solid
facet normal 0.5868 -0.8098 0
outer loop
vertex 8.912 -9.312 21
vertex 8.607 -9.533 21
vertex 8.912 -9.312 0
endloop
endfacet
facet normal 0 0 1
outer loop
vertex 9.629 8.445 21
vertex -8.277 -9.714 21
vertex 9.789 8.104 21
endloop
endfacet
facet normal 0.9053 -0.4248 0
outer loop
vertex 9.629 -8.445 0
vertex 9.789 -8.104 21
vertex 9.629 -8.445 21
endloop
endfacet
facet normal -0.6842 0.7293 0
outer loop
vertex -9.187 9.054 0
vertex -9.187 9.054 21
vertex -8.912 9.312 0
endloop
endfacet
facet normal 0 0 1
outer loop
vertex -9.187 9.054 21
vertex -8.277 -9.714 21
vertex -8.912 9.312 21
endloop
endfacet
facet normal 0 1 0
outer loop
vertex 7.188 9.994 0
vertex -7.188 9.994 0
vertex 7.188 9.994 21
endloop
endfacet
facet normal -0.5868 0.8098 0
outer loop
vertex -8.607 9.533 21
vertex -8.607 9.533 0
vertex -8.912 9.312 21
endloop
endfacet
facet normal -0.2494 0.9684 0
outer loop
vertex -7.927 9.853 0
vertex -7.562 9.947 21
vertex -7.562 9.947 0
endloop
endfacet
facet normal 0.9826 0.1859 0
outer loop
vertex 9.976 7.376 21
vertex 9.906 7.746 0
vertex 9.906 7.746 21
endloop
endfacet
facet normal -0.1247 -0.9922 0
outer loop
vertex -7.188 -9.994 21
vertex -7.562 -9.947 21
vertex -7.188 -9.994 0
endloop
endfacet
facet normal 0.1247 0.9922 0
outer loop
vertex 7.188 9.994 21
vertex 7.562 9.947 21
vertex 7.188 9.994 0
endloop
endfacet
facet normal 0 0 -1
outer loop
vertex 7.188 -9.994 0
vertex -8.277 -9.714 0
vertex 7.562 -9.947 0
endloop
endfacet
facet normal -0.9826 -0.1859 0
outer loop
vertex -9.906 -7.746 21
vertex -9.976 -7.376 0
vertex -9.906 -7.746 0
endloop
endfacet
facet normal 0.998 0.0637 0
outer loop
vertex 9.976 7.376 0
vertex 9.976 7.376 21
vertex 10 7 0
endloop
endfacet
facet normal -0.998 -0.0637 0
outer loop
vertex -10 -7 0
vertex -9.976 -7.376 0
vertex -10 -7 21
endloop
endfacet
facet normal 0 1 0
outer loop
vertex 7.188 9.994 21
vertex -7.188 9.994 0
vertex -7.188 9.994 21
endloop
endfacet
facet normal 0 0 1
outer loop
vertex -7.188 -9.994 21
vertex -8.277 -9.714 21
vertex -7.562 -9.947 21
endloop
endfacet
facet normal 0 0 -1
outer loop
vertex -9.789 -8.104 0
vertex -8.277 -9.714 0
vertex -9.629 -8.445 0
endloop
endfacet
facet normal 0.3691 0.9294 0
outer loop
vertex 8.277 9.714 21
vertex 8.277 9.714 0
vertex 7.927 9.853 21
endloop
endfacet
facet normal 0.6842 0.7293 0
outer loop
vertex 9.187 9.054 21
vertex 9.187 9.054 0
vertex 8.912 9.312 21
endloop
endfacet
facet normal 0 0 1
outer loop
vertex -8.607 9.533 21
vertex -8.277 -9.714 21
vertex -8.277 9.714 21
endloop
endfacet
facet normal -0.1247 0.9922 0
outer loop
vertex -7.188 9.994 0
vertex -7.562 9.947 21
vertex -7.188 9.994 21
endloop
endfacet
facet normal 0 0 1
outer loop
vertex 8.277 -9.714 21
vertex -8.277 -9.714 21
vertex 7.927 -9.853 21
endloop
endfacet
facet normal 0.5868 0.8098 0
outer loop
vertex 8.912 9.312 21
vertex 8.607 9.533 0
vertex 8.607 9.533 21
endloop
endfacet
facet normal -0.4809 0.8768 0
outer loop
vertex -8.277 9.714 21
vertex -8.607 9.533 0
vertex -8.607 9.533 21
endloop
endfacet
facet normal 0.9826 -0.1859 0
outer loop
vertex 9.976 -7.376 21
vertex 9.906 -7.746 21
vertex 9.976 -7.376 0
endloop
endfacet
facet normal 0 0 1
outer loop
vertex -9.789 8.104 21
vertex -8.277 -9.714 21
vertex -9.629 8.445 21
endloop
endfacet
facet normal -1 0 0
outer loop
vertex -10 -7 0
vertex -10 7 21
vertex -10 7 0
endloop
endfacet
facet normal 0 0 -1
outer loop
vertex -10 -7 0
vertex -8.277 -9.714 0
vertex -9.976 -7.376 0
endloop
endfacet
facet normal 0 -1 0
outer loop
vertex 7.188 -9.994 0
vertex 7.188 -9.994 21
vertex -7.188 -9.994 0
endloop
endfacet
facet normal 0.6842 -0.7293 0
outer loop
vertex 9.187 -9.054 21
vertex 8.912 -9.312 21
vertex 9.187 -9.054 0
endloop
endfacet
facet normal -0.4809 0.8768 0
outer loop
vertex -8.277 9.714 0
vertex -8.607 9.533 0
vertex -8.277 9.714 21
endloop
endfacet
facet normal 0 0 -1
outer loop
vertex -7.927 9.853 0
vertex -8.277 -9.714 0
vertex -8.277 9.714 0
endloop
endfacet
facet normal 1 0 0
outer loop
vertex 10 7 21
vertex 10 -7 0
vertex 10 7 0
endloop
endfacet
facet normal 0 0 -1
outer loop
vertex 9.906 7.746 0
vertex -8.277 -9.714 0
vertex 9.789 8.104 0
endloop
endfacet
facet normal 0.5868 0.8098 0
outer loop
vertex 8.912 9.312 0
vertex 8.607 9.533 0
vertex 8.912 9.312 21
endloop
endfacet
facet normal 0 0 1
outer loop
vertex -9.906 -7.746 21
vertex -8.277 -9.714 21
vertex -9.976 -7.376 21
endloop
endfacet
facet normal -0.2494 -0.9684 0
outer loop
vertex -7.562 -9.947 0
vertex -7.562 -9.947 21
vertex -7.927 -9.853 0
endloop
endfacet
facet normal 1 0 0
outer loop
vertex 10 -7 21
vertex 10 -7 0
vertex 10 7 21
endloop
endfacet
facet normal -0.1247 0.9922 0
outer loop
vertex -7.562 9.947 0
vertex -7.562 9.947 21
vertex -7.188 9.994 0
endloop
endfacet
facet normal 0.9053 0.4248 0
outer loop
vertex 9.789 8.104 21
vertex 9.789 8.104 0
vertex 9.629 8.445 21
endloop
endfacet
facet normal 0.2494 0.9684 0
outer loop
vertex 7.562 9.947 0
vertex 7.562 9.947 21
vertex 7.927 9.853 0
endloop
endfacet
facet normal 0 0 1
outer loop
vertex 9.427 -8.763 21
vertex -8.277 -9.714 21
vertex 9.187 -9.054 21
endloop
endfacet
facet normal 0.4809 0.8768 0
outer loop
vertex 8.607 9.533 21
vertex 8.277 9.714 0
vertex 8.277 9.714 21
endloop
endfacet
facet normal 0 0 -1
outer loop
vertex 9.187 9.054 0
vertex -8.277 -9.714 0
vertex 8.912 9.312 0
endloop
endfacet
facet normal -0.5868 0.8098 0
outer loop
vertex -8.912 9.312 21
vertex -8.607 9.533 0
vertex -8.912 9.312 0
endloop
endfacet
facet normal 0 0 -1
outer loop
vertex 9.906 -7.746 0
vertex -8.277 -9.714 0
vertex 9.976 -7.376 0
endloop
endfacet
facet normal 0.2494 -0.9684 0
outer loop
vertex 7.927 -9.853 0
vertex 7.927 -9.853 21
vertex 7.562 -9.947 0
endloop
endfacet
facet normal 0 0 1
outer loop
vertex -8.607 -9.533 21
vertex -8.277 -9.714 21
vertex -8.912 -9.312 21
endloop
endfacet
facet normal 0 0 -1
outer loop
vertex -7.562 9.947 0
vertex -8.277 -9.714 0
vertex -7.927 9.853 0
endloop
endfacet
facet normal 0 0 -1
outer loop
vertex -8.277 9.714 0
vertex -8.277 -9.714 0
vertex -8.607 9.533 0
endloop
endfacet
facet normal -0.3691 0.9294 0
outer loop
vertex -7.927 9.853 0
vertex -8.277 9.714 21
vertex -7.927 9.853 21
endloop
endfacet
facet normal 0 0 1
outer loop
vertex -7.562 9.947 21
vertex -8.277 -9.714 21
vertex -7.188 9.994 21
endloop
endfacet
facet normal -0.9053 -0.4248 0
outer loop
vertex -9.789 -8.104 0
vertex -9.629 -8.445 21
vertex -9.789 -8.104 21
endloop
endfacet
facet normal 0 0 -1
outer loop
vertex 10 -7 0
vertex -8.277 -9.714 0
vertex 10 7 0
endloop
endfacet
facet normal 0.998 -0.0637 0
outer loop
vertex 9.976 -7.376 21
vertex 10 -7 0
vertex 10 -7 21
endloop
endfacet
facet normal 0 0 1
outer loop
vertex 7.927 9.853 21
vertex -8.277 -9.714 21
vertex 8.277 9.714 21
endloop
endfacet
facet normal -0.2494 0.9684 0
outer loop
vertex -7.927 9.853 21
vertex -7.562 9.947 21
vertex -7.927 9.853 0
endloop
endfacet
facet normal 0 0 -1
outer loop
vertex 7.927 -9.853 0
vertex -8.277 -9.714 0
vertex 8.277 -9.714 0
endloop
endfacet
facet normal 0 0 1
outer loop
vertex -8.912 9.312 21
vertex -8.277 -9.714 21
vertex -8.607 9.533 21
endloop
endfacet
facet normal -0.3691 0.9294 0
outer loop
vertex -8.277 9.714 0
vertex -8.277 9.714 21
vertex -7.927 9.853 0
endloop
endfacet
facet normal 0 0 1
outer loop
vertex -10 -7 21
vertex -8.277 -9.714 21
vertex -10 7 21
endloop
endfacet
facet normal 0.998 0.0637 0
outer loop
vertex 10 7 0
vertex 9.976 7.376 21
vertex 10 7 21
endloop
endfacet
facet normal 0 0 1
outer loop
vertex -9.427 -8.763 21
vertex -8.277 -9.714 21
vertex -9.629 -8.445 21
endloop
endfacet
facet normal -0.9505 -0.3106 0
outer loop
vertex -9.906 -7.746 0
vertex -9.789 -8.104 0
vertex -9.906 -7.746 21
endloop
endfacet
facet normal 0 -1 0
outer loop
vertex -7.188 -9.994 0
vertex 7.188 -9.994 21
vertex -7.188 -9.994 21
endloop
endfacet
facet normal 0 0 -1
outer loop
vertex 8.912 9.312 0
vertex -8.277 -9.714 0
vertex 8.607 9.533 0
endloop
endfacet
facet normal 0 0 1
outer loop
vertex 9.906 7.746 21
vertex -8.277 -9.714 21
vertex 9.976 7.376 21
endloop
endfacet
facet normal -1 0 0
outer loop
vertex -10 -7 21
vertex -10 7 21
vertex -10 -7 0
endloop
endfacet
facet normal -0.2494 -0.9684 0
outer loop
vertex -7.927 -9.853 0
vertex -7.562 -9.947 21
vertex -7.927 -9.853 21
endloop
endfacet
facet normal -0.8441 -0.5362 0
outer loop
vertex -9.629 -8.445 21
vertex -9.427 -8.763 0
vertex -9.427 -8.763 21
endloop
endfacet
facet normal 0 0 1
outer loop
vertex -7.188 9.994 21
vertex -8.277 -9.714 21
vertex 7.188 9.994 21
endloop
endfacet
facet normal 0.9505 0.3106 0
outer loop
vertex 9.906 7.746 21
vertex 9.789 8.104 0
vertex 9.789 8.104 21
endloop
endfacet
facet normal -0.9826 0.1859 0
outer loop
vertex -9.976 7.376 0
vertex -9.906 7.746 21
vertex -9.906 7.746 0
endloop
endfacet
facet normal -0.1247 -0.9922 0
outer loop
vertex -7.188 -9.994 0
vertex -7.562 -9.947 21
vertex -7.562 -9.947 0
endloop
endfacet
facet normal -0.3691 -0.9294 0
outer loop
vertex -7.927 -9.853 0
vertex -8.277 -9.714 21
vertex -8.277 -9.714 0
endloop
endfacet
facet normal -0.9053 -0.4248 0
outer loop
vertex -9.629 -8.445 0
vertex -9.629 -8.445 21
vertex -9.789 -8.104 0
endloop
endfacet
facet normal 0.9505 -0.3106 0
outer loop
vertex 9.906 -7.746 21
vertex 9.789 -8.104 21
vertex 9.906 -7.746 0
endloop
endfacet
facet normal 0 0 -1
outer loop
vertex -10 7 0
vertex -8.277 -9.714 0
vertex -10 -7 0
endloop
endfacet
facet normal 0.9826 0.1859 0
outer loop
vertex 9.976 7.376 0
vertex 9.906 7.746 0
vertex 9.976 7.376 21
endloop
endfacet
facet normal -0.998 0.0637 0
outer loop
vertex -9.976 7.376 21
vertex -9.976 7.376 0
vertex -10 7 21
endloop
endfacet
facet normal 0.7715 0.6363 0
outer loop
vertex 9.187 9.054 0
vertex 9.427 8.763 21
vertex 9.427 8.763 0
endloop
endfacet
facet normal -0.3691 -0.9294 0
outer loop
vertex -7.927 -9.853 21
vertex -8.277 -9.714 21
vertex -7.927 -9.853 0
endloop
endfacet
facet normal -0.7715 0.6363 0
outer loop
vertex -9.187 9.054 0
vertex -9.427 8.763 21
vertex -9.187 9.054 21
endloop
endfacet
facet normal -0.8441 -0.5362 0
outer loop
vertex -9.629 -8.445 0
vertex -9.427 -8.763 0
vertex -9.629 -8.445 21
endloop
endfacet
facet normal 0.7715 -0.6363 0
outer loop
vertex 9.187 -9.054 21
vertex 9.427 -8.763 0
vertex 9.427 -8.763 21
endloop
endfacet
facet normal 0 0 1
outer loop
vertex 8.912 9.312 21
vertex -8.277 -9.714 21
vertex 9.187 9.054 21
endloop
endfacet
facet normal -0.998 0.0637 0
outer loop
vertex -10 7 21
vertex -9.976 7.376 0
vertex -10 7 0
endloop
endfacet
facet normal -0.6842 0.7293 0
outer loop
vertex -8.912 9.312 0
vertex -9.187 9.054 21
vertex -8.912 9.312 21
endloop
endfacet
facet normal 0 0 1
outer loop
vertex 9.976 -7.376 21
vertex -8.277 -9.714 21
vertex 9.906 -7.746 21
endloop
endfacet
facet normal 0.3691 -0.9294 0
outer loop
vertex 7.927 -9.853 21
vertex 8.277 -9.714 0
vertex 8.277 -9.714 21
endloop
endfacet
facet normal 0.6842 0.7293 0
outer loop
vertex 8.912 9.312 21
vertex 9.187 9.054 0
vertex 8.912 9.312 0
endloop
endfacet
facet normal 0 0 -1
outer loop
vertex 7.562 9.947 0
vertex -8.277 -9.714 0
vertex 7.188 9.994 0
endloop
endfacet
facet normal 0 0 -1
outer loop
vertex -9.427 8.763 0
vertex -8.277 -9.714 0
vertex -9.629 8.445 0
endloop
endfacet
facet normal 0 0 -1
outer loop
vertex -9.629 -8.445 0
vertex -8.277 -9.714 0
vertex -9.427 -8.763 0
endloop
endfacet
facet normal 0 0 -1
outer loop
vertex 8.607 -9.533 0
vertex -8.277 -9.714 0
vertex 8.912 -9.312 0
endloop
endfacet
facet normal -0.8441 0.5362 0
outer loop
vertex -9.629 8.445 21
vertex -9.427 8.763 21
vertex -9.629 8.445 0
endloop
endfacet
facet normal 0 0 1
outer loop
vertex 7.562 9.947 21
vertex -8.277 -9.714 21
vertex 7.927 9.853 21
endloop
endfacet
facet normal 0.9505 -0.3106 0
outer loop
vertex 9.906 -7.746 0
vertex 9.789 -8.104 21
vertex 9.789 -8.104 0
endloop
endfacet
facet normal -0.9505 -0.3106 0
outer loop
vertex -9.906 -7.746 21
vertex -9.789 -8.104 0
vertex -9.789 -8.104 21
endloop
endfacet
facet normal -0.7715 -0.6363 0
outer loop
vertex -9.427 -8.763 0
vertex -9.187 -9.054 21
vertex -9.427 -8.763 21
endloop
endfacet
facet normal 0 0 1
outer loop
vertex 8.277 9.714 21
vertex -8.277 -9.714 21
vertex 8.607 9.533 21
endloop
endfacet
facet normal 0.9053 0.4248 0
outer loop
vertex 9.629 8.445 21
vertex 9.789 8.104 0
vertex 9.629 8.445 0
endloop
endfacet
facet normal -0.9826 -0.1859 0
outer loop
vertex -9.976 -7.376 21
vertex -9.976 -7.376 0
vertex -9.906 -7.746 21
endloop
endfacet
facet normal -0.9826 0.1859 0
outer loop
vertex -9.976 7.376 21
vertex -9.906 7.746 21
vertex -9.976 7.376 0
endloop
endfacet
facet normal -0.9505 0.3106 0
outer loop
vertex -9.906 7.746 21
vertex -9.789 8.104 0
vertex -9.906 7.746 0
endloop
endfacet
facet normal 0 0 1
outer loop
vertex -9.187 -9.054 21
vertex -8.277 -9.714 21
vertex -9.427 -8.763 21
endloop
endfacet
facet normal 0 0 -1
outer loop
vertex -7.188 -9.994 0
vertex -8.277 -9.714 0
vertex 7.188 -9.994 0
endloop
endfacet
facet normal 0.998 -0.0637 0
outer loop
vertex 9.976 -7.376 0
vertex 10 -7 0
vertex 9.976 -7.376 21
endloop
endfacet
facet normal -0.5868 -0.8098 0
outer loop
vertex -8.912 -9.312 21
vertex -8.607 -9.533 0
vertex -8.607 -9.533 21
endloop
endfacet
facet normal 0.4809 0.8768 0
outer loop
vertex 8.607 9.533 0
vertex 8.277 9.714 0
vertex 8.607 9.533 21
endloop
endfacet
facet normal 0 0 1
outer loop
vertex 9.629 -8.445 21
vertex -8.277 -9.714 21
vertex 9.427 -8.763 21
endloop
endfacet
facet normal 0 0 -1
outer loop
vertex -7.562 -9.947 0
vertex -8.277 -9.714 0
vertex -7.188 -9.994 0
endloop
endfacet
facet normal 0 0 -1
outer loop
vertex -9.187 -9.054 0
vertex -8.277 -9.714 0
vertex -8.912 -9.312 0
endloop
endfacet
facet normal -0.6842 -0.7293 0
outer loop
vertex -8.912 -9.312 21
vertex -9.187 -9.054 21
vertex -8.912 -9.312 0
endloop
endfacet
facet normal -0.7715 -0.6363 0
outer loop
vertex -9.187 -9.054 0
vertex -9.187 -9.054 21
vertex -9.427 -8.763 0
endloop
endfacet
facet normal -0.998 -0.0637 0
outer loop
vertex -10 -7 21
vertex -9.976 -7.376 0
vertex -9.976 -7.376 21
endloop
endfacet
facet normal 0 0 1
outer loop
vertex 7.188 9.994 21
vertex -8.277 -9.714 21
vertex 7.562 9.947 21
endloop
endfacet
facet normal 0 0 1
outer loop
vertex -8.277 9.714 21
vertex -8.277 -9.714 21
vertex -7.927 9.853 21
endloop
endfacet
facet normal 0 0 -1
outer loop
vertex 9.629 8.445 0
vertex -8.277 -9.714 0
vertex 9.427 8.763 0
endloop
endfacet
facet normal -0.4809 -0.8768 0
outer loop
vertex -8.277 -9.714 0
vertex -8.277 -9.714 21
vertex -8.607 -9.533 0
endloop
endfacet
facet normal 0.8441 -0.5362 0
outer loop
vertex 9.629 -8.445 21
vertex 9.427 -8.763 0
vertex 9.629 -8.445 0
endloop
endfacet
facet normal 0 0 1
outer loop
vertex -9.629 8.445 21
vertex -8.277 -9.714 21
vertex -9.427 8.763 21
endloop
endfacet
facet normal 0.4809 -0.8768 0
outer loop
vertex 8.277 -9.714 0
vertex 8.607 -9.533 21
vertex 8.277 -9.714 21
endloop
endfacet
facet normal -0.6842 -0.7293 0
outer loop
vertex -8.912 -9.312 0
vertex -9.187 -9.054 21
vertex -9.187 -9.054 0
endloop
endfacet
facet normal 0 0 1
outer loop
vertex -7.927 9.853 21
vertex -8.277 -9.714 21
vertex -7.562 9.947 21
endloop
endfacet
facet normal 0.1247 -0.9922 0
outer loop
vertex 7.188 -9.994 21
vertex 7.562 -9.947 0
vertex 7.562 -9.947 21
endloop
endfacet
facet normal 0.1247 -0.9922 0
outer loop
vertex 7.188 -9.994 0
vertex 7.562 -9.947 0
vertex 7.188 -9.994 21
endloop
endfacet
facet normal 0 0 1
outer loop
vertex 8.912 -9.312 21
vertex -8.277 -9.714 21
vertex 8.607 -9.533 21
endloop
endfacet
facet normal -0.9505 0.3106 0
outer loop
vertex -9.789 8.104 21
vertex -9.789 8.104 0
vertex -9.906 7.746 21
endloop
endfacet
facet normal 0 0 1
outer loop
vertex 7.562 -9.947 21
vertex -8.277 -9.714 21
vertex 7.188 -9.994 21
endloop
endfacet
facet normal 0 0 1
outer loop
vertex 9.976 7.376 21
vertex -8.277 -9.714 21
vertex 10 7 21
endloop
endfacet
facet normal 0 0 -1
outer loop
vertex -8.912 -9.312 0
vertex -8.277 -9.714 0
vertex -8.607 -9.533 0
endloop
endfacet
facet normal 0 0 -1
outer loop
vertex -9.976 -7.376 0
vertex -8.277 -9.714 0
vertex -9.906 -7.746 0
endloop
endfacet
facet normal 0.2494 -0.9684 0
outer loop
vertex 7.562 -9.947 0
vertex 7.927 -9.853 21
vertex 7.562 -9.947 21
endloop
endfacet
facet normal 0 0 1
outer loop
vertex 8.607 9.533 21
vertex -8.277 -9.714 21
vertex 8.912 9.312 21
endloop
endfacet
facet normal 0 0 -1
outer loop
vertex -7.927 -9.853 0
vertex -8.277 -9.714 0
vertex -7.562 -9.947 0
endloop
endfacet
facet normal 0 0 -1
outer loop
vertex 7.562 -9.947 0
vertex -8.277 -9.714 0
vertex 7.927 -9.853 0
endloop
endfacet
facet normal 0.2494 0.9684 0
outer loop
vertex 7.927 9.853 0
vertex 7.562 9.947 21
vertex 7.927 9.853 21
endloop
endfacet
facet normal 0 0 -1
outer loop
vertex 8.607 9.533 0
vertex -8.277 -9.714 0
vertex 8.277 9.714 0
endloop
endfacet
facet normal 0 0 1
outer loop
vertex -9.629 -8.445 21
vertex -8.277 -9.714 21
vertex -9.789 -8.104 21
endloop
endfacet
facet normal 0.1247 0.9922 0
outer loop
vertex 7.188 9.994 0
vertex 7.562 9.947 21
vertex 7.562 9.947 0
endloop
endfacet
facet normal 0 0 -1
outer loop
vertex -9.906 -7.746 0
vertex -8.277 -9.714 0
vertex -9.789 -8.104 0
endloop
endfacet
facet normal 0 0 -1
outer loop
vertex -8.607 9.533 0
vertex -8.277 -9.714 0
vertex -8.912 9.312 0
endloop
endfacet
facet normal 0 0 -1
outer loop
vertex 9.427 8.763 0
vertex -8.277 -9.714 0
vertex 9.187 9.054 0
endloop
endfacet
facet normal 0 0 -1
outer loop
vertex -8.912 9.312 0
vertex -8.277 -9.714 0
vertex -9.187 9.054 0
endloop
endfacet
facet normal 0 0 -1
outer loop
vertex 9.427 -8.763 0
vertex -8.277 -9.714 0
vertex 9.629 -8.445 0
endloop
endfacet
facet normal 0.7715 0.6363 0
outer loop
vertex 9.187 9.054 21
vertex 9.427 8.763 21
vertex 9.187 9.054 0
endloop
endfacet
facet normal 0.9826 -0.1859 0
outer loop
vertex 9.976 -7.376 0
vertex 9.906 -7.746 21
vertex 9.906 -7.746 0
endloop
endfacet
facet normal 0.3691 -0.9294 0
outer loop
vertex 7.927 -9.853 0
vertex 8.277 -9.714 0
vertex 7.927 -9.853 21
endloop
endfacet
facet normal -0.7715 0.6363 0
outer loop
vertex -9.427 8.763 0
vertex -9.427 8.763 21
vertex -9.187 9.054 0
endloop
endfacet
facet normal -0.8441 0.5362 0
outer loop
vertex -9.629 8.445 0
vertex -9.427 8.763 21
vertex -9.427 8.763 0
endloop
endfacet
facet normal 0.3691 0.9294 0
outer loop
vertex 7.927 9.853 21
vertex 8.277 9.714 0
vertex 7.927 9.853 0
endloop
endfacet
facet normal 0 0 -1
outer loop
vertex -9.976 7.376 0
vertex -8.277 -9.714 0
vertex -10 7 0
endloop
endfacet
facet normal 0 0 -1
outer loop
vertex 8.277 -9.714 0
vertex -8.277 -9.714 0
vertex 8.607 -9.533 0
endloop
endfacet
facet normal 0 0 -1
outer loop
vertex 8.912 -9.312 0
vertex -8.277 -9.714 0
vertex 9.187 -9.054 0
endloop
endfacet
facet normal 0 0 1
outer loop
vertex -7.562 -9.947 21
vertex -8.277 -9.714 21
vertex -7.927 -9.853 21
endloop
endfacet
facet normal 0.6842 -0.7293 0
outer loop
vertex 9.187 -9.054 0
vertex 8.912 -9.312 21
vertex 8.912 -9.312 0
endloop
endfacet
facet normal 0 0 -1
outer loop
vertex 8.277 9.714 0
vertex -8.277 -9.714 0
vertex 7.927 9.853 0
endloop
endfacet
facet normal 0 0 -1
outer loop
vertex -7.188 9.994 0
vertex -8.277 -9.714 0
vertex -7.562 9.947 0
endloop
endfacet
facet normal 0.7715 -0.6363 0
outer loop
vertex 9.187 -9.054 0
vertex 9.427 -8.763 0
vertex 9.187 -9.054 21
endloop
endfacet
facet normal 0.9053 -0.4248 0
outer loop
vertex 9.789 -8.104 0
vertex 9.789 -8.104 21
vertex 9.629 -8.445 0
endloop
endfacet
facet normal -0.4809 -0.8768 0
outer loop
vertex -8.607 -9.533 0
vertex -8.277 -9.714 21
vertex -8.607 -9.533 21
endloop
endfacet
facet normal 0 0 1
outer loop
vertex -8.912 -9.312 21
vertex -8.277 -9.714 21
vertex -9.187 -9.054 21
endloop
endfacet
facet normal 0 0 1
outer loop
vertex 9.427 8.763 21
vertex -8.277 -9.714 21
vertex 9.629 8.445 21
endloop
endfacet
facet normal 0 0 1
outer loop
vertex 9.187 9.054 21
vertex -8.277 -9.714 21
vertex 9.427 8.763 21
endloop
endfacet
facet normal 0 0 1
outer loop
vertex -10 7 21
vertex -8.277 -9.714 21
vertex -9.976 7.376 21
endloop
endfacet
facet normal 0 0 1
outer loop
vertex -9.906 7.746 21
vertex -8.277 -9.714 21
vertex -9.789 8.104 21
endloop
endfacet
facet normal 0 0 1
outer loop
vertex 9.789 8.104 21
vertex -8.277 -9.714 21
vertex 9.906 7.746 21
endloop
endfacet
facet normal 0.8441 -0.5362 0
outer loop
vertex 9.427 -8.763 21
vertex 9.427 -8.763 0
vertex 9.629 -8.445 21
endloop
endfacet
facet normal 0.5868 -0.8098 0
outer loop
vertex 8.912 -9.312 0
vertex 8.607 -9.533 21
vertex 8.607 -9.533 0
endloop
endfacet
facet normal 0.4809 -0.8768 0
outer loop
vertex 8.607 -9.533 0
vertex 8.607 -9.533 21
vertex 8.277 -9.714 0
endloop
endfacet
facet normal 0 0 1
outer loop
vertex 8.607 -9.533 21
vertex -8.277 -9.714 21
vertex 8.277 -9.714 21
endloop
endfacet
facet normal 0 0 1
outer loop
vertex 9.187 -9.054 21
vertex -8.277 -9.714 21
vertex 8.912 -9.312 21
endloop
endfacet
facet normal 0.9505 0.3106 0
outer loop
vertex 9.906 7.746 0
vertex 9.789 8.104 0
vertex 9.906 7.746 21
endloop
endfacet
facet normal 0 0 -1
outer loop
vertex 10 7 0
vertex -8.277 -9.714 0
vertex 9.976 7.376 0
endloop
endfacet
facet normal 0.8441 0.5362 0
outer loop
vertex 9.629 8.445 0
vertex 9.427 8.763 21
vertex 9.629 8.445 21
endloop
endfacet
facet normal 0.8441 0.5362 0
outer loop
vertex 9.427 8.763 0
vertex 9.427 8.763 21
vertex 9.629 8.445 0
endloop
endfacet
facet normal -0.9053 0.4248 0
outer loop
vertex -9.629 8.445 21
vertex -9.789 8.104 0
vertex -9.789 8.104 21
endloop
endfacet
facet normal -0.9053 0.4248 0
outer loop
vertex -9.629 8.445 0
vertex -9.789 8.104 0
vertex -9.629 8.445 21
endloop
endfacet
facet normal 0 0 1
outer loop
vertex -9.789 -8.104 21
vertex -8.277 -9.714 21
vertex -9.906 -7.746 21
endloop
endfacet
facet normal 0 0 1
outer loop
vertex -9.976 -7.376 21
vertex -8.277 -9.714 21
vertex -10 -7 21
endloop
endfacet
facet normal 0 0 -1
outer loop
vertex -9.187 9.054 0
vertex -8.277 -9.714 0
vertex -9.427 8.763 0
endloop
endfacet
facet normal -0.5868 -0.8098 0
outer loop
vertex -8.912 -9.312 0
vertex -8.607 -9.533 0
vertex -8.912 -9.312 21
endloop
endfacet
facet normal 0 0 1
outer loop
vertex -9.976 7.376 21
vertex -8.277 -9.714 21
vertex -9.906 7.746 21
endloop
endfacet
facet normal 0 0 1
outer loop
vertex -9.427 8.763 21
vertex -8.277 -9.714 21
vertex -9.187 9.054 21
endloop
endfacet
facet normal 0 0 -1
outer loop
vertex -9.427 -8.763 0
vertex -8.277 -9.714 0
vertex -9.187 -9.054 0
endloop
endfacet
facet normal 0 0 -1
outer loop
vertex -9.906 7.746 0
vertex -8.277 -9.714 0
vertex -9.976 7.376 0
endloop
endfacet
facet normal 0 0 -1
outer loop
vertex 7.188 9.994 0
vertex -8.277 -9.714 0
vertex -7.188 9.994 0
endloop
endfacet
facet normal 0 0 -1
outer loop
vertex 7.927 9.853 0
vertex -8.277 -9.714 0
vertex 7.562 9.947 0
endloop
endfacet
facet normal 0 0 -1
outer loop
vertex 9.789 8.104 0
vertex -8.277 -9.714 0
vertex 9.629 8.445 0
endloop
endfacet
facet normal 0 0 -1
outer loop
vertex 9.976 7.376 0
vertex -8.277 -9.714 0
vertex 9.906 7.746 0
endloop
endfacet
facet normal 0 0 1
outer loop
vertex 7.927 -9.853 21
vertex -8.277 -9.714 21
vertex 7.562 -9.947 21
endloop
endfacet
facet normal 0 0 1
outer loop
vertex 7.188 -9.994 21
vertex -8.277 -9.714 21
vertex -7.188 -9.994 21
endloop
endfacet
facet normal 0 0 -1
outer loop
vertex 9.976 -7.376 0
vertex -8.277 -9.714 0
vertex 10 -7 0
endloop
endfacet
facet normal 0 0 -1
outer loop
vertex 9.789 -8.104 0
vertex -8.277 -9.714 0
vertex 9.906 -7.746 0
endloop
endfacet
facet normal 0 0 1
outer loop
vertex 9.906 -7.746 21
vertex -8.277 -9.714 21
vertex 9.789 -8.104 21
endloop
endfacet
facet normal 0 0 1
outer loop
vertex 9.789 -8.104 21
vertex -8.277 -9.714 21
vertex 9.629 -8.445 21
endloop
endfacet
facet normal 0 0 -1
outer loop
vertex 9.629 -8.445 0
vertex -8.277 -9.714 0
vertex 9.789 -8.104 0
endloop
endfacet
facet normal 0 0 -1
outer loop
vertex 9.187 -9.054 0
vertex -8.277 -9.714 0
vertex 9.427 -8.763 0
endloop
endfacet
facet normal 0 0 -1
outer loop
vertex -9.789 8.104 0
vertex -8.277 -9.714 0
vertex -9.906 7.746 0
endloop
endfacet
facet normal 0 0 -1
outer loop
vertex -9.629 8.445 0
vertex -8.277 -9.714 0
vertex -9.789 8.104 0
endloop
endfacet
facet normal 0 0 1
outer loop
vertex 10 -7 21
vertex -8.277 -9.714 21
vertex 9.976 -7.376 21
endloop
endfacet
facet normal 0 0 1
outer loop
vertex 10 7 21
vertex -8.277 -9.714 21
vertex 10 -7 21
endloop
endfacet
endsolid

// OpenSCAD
$fn = 50;


module tube(height, width, fillet, hole){
	if(hole>0){
		difference(){
			translate([fillet-width/2,fillet-width/2,0]){
				minkowski(){
					cube([width-fillet*2,width-fillet*2,height]);
					cylinder(r=fillet,h=1);
				}
			}
			translate([width/2,width/2,-.5])
			cylinder(h=height+2,r=hole); 
		}
	} else {
	translate([fillet-width/2,fillet-width/2,0]){
		minkowski(){
			cube([width-fillet*2,width-fillet*2,height]);
			cylinder(r=fillet,h=1);
		}
	}
}
}



tube(20,20,3,0);
